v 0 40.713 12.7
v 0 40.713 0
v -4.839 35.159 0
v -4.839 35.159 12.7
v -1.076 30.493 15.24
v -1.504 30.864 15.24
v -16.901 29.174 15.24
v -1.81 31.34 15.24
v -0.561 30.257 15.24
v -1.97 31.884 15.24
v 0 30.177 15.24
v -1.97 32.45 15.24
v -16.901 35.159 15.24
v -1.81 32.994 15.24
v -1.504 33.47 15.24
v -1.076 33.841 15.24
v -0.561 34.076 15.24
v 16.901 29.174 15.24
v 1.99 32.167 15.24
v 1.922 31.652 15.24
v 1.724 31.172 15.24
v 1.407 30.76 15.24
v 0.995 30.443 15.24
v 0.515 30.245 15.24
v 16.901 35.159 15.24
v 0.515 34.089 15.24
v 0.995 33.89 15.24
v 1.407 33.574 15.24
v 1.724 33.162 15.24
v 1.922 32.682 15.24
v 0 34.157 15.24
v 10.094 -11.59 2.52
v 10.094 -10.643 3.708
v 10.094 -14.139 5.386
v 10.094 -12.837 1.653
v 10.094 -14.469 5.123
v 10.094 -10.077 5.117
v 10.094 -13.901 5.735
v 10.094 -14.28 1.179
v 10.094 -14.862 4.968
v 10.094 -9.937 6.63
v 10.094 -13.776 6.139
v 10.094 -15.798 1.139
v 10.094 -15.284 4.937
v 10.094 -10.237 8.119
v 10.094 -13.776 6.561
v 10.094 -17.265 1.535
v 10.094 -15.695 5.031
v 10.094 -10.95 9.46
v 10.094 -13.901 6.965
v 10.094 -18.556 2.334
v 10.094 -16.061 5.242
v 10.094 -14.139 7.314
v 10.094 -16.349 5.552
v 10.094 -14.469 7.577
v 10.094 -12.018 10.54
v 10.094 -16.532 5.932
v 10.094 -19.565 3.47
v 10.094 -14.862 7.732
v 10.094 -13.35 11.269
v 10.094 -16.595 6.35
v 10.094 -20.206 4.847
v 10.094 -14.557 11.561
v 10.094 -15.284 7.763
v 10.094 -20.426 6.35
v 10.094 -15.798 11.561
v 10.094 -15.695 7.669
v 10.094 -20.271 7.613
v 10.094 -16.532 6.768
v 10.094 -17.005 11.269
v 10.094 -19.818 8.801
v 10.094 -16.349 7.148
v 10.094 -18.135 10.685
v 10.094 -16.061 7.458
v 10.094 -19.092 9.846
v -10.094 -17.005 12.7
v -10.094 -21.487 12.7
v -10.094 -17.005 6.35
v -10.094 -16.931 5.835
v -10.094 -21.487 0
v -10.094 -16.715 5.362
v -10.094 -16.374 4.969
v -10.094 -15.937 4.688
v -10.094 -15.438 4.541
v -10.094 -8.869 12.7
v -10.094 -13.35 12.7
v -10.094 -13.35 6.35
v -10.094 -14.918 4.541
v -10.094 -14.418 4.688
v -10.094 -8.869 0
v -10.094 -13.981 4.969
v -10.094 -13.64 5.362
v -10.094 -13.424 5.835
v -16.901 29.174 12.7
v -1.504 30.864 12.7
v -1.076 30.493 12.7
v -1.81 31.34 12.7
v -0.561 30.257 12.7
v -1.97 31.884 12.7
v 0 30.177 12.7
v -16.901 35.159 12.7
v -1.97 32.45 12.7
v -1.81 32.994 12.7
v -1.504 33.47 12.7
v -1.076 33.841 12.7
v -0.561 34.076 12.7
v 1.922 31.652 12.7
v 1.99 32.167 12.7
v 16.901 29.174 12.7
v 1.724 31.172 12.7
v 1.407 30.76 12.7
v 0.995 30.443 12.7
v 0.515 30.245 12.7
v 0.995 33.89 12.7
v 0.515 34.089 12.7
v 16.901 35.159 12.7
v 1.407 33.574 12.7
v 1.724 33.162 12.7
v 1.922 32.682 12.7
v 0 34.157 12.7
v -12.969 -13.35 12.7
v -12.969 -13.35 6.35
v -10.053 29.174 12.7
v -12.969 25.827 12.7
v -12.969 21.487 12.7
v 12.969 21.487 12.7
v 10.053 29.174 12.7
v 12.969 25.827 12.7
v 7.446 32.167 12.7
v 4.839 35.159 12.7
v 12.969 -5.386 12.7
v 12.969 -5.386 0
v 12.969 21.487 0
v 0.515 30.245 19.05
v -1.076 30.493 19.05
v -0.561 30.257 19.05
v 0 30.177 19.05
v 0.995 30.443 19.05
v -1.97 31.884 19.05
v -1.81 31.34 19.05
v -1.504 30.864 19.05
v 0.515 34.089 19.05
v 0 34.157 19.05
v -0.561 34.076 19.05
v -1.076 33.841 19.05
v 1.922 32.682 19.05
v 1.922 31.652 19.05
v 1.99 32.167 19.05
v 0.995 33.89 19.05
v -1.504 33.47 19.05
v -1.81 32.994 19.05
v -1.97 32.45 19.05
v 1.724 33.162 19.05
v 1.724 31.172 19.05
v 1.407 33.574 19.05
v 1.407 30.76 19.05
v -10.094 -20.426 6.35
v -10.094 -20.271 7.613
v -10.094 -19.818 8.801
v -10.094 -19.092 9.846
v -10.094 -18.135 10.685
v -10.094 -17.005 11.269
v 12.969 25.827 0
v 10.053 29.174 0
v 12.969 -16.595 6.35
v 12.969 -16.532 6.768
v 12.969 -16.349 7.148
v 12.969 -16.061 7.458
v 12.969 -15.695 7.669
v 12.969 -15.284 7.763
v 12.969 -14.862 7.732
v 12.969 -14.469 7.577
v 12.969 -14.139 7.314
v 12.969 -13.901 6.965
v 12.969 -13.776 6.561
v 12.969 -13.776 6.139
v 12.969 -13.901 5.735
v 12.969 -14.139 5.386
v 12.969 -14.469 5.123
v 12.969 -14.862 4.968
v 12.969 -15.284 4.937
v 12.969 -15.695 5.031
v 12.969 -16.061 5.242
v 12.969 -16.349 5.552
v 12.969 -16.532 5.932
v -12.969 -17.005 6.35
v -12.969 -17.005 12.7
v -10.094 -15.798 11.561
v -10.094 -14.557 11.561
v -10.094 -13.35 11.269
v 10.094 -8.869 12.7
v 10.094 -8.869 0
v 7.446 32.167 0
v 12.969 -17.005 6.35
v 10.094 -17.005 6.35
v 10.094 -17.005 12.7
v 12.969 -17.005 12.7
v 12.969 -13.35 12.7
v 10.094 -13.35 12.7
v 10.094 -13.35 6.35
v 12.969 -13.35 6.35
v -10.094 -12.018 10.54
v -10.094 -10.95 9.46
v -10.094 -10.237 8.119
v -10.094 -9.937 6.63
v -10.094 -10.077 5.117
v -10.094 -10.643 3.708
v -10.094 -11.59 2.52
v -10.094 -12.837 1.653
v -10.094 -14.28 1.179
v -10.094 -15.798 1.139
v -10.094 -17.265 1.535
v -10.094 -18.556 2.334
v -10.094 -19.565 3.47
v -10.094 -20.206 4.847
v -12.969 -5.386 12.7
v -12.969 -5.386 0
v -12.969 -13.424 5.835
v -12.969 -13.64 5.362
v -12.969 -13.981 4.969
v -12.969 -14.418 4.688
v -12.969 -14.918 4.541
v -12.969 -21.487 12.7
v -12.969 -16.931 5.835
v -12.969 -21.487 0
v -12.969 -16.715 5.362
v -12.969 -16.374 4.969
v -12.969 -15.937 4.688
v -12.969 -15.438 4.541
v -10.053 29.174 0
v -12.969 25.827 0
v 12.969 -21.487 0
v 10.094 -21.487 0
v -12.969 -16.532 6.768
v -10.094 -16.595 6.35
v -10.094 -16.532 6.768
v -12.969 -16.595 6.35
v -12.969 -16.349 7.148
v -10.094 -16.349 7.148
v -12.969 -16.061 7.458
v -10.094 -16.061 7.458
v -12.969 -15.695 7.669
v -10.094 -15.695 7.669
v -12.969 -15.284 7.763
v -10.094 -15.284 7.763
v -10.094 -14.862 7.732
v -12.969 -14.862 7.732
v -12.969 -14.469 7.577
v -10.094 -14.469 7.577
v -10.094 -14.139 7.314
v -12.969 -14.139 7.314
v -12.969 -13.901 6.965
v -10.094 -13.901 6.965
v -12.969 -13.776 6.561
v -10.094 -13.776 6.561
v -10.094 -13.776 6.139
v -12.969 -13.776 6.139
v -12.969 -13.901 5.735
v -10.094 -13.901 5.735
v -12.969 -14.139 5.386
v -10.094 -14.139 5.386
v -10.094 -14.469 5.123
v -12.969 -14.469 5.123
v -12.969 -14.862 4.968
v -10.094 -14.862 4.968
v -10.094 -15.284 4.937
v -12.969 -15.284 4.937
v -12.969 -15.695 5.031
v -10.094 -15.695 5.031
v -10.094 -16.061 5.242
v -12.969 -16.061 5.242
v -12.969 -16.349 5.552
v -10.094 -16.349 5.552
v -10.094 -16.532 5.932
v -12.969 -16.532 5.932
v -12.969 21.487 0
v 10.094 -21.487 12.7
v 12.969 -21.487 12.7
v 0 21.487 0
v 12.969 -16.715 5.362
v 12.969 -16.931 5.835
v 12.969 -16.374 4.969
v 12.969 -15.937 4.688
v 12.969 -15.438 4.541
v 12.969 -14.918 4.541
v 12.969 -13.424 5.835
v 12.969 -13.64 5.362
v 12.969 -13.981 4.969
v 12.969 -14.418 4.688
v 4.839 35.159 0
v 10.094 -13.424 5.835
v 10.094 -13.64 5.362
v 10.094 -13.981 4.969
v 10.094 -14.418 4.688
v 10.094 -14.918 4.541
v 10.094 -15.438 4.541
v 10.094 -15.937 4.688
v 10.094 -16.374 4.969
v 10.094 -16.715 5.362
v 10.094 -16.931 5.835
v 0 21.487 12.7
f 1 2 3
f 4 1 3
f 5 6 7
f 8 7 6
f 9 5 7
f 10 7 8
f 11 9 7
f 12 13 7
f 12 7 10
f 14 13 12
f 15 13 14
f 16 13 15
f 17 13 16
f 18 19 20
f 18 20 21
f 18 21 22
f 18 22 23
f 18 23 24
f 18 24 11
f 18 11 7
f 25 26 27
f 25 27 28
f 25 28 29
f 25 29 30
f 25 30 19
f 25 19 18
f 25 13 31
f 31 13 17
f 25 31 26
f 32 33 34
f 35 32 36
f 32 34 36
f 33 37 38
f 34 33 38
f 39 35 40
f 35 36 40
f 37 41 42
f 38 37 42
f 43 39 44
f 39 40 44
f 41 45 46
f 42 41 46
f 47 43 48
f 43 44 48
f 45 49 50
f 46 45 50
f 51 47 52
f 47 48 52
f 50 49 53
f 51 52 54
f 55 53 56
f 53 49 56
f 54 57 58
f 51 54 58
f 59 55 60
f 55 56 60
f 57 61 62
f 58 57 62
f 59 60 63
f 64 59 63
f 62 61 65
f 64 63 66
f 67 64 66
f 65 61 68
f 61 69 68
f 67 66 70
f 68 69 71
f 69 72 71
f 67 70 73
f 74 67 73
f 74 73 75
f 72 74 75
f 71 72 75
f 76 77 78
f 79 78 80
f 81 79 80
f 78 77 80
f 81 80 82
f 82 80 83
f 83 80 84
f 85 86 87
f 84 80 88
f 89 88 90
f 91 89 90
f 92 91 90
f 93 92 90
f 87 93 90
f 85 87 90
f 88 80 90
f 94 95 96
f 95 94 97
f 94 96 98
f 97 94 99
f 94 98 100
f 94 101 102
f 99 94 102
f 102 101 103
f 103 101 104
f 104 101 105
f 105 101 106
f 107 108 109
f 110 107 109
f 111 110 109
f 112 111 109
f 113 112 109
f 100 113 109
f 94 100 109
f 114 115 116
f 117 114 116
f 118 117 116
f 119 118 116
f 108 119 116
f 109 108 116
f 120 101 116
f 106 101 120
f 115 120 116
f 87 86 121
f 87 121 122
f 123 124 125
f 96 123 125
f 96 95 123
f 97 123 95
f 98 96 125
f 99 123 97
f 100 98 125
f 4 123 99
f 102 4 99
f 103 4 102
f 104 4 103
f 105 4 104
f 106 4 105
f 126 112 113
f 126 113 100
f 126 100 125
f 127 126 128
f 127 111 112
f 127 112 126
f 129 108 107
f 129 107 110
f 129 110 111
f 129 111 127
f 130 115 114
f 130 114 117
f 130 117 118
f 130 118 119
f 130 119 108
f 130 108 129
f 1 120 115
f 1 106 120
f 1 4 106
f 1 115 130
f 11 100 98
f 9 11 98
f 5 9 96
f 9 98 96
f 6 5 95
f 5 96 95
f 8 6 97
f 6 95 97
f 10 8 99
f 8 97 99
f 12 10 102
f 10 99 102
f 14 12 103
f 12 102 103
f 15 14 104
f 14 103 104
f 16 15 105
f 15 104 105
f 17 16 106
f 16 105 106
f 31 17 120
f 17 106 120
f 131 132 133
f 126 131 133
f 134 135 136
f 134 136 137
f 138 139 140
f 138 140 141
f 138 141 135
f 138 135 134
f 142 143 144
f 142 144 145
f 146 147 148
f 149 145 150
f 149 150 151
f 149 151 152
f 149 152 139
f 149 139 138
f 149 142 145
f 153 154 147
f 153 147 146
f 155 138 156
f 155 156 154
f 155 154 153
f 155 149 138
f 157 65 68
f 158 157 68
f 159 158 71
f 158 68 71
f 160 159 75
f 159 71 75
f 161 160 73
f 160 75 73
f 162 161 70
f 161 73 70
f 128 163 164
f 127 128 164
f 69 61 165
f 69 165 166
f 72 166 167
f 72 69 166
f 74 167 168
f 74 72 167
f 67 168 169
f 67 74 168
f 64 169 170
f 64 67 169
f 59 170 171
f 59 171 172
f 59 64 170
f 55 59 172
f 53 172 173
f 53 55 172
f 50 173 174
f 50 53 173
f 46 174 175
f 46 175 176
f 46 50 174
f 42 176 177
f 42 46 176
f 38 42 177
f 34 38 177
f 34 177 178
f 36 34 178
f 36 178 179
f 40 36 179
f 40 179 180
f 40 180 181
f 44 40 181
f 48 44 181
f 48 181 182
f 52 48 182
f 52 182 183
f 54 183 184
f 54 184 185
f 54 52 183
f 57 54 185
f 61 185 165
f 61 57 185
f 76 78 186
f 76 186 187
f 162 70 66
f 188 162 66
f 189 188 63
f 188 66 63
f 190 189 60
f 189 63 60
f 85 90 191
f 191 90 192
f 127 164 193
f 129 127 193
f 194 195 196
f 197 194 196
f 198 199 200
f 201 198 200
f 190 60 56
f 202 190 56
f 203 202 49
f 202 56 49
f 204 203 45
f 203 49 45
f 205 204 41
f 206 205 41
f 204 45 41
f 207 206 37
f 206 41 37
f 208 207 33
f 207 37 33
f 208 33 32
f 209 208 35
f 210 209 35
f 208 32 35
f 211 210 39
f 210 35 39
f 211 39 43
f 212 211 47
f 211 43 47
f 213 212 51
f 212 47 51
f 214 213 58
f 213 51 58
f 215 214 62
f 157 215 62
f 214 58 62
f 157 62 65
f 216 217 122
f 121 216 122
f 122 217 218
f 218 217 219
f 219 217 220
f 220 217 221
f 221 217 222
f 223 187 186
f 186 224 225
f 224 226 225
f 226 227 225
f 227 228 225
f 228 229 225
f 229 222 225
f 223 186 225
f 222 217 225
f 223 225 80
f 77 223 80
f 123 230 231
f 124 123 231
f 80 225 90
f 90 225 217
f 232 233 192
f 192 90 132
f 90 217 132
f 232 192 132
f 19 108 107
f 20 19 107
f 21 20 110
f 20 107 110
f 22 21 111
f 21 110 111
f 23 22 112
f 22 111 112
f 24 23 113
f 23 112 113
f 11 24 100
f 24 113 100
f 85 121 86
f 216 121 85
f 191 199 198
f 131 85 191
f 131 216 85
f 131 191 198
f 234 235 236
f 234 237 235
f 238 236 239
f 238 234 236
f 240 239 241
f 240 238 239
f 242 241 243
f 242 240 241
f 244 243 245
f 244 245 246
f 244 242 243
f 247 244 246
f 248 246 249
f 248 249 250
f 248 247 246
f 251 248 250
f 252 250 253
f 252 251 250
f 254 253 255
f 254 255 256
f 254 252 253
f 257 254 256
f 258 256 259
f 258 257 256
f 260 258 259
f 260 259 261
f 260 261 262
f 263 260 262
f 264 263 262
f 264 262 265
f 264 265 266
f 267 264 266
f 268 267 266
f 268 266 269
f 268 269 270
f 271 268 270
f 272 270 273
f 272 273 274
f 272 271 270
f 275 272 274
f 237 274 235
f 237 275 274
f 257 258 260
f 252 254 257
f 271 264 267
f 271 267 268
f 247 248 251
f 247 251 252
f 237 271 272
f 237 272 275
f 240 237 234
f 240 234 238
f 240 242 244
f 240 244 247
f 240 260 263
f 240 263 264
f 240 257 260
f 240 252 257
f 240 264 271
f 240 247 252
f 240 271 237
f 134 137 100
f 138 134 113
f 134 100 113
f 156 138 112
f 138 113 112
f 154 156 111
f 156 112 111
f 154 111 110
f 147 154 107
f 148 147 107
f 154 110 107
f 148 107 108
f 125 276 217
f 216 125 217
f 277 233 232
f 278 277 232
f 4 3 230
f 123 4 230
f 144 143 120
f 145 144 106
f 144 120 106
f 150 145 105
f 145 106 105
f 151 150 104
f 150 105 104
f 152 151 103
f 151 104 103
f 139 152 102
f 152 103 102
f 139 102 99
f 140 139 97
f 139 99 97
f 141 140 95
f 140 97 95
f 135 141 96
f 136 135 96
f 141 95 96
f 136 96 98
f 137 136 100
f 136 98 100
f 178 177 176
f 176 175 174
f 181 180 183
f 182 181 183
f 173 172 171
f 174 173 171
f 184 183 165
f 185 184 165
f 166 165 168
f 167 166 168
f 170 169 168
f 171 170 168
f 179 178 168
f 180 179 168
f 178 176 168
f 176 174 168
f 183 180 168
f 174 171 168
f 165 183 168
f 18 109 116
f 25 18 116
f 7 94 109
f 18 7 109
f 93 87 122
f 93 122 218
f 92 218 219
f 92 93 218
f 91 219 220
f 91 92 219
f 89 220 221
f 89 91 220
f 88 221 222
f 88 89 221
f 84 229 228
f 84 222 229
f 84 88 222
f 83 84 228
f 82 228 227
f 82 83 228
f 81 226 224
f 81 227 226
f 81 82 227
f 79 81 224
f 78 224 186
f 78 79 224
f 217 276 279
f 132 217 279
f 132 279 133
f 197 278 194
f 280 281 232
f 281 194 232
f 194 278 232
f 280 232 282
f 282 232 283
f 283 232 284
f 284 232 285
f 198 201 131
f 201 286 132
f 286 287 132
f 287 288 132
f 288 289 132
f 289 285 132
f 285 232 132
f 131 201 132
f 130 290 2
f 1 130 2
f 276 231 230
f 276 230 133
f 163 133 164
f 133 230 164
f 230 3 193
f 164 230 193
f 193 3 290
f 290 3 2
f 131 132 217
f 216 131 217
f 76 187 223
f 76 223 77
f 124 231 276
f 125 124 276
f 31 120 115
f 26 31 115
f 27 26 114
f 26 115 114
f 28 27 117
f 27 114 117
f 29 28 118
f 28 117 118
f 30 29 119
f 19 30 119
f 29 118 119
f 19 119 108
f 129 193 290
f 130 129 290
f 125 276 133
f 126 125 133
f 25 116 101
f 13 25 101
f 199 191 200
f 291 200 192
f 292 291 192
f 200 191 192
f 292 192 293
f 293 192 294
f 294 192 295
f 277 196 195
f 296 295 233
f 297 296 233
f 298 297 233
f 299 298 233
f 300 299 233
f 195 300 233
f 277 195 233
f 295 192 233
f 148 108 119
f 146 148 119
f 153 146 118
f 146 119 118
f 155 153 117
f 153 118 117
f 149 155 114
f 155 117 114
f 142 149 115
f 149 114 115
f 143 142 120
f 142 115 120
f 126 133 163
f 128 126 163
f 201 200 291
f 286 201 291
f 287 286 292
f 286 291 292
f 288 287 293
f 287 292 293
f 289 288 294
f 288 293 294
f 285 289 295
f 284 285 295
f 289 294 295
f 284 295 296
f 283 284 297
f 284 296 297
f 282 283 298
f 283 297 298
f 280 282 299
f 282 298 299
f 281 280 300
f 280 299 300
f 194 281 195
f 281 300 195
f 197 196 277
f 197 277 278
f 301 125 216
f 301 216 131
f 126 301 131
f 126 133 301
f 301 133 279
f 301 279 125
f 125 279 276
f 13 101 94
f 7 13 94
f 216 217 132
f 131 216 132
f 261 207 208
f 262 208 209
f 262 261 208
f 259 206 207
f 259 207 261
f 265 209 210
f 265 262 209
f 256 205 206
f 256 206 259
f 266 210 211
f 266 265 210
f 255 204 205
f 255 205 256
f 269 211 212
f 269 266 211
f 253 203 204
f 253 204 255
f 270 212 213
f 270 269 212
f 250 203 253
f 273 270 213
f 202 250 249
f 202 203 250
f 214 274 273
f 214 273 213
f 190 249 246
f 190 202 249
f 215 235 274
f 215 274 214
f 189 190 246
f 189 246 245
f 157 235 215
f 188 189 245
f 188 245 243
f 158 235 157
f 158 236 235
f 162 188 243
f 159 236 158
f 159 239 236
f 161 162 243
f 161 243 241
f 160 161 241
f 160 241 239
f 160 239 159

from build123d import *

# Parameters (mm, degrees)
F0_W          = 12.9693616182
F0_H          = 21.4865580201
F0_H_2        = 5.3862379864
F1_DEPTH      = 12.7
F2_DEPTH      = 12.7
F3_DEPTH      = 12.7
F4_DEPTH      = 19.05
F5_START      = 12.7
F5_DEPTH      = 2.54
F6_R          = 1.4172462463
F7_DEPTH      = 6.8084548617
F7_DEPTH_BACK = 26.9963636453
F8_DEPTH      = 23.0633160099
F8_DEPTH_BACK = 2.8754072264
F9_DEPTH      = 20.1879087836


with BuildPart() as f1:
    # F0 (on Top) → F1 (new body)
    with BuildSketch(Plane.XY):
        Polygon((0, 0), (0, 21.4865580201), (-12.9693616182, 21.4865580201), (-12.9693616182, 0), (-12.9693616182, -5.3862379864), (0, -5.3862379864), align=None)
        with Locations((6.4846808091, 10.7432790101)):
            Rectangle(F0_W, F0_H)
        with Locations((6.4846808091, -2.6931189932)):
            Rectangle(F0_W, F0_H_2)
    extrude(amount=F1_DEPTH)


with BuildPart() as f2:
    # F0 (on Top) → F2 (new body, through all)
    with BuildSketch(Plane.XY):
        Polygon((0, -8.8687147945), (0, -5.3862379864), (-12.9693616182, -5.3862379864), (-12.9693616182, -21.4865580201), (-10.0939543918, -21.4865580201), (-10.0939543918, -8.8687147945), align=None)
        Polygon((12.9693616182, -5.3862379864), (0, -5.3862379864), (0, -8.8687147945), (10.0939543918, -8.8687147945), (10.0939543918, -21.4865580201), (12.9693616182, -21.4865580201), align=None)
    extrude(amount=F2_DEPTH)

    # F6 (on face) → F7 (cut, two sides)
    with BuildSketch(Plane(origin=(10.0939543918, 0, 0), x_dir=(0, -1, 0), z_dir=(-1, 0, 0))) as f7_sk:
        with BuildLine():
            ThreePointArc((13.3500925612, 6.35), (15.1776364073, 4.5224561539), (17.0051802535, 6.35))
            ThreePointArc((17.0051802535, 6.35), (15.1776364073, 8.1775438461), (13.3500925612, 6.35))
        make_face()
        with Locations((15.1776364073, 6.35)):
            Circle(F6_R, mode=Mode.SUBTRACT)
        with Locations((15.1776364073, 6.35)):
            Circle(F6_R)
        with BuildLine():
            ThreePointArc((13.3500925612, 6.35), (15.1776364073, 8.1775438461), (17.0051802535, 6.35))
            Line((17.0051802535, 6.35), (17.0051802535, 11.2694925814))
            ThreePointArc((17.0051802535, 11.2694925814), (15.1776364073, 11.5979828284), (13.3500925612, 11.2694925814))
            Line((13.3500925612, 11.2694925814), (13.3500925612, 6.35))
        make_face()
        with BuildLine():
            ThreePointArc((13.3500925612, 11.2694925814), (15.1776364073, 11.5979828284), (17.0051802535, 11.2694925814))
            Line((17.0051802535, 11.2694925814), (17.0051802535, 12.7))
            Line((17.0051802535, 12.7), (13.3500925612, 12.7))
            Line((13.3500925612, 12.7), (13.3500925612, 11.2694925814))
        make_face()
    extrude(amount=-F7_DEPTH, mode=Mode.SUBTRACT)
    extrude(f7_sk.sketch, amount=F7_DEPTH_BACK, mode=Mode.SUBTRACT)


with BuildPart() as f3:
    # F0 (on Top) → F3 (new body, through all)
    with BuildSketch(Plane.XY):
        Polygon((-12.9693616182, 21.4865580201), (0, 21.4865580201), (0, 29.1743092239), (-10.0531563319, 29.1743092239), (-12.9693616182, 25.8271116763), align=None)
        Polygon((0, 29.1743092239), (0, 21.4865580201), (12.9693616182, 21.4865580201), (12.9693616182, 25.8271116763), (10.0531563319, 29.1743092239), align=None)
        with BuildLine():
            Line((0, 30.1767262363), (0, 29.1743092239))
            Line((0, 29.1743092239), (10.0531563319, 29.1743092239))
            Line((10.0531563319, 29.1743092239), (7.4459156487, 32.1668796241))
            Line((7.4459156487, 32.1668796241), (1.9901533878, 32.1668796241))
            ThreePointArc((1.9901533878, 32.1668796241), (1.4072509561, 30.759628668), (0, 30.1767262363))
        make_face()
        with BuildLine():
            Line((0, 35.1594500244), (0, 34.1570330119))
            ThreePointArc((0, 34.1570330119), (1.4072509561, 33.5741305802), (1.9901533878, 32.1668796241))
            Line((1.9901533878, 32.1668796241), (7.4459156487, 32.1668796241))
            Line((7.4459156487, 32.1668796241), (4.8386749655, 35.1594500244))
            Line((4.8386749655, 35.1594500244), (0, 35.1594500244))
        make_face()
        Polygon((0, 40.7132431865), (0, 35.1594500244), (4.8386749655, 35.1594500244), align=None)
        with BuildLine():
            Line((-10.0531563319, 29.1743092239), (0, 29.1743092239))
            Line((0, 29.1743092239), (0, 30.1767262363))
            ThreePointArc((0, 30.1767262363), (-1.9901533878, 32.1668796241), (0, 34.1570330119))
            Line((0, 34.1570330119), (0, 35.1594500244))
            Line((0, 35.1594500244), (-4.8386749655, 35.1594500244))
            Line((-4.8386749655, 35.1594500244), (-10.0531563319, 29.1743092239))
        make_face()
        Polygon((0, 40.7132431865), (-4.8386749655, 35.1594500244), (0, 35.1594500244), align=None)
        with BuildLine():
            Line((0, 32.1668796241), (0, 30.1767262363))
            ThreePointArc((0, 30.1767262363), (1.4072509561, 30.759628668), (1.9901533878, 32.1668796241))
            Line((1.9901533878, 32.1668796241), (0, 32.1668796241))
        make_face()
        with BuildLine():
            ThreePointArc((0, 34.1570330119), (-1.9901533878, 32.1668796241), (0, 30.1767262363))
            Line((0, 30.1767262363), (0, 32.1668796241))
            Line((0, 32.1668796241), (0, 34.1570330119))
        make_face()
        with BuildLine():
            Line((0, 34.1570330119), (0, 32.1668796241))
            Line((0, 32.1668796241), (1.9901533878, 32.1668796241))
            ThreePointArc((1.9901533878, 32.1668796241), (1.4072509561, 33.5741305802), (0, 34.1570330119))
        make_face()
    extrude(amount=F3_DEPTH)

    # F0 (on Top) → F4 (join)
    with BuildSketch(Plane.XY):
        with BuildLine():
            Line((0, 32.1668796241), (0, 30.1767262363))
            ThreePointArc((0, 30.1767262363), (1.4072509561, 30.759628668), (1.9901533878, 32.1668796241))
            Line((1.9901533878, 32.1668796241), (0, 32.1668796241))
        make_face()
        with BuildLine():
            Line((0, 34.1570330119), (0, 32.1668796241))
            Line((0, 32.1668796241), (1.9901533878, 32.1668796241))
            ThreePointArc((1.9901533878, 32.1668796241), (1.4072509561, 33.5741305802), (0, 34.1570330119))
        make_face()
        with BuildLine():
            ThreePointArc((0, 34.1570330119), (-1.9901533878, 32.1668796241), (0, 30.1767262363))
            Line((0, 30.1767262363), (0, 32.1668796241))
            Line((0, 32.1668796241), (0, 34.1570330119))
        make_face()
    extrude(amount=F4_DEPTH)


with BuildPart() as f5:
    # F0 (on Top) → F5 (new body)
    with BuildSketch(Plane.XY.offset(F5_START)):
        Polygon((7.4459156487, 32.1668796241), (10.0531563319, 29.1743092239), (16.9014092535, 29.1743092239), (16.9014092535, 32.1668796241), align=None)
        with BuildLine():
            Line((0, 30.1767262363), (0, 29.1743092239))
            Line((0, 29.1743092239), (10.0531563319, 29.1743092239))
            Line((10.0531563319, 29.1743092239), (7.4459156487, 32.1668796241))
            Line((7.4459156487, 32.1668796241), (1.9901533878, 32.1668796241))
            ThreePointArc((1.9901533878, 32.1668796241), (1.4072509561, 30.759628668), (0, 30.1767262363))
        make_face()
        Polygon((4.8386749655, 35.1594500244), (7.4459156487, 32.1668796241), (16.9014092535, 32.1668796241), (16.9014092535, 35.1594500244), align=None)
        with BuildLine():
            Line((0, 35.1594500244), (0, 34.1570330119))
            ThreePointArc((0, 34.1570330119), (1.4072509561, 33.5741305802), (1.9901533878, 32.1668796241))
            Line((1.9901533878, 32.1668796241), (7.4459156487, 32.1668796241))
            Line((7.4459156487, 32.1668796241), (4.8386749655, 35.1594500244))
            Line((4.8386749655, 35.1594500244), (0, 35.1594500244))
        make_face()
        with BuildLine():
            Line((-10.0531563319, 29.1743092239), (0, 29.1743092239))
            Line((0, 29.1743092239), (0, 30.1767262363))
            ThreePointArc((0, 30.1767262363), (-1.9901533878, 32.1668796241), (0, 34.1570330119))
            Line((0, 34.1570330119), (0, 35.1594500244))
            Line((0, 35.1594500244), (-4.8386749655, 35.1594500244))
            Line((-4.8386749655, 35.1594500244), (-10.0531563319, 29.1743092239))
        make_face()
        Polygon((-16.9014092535, 29.1743092239), (-10.0531563319, 29.1743092239), (-4.8386749655, 35.1594500244), (-16.9014092535, 35.1594500244), (-16.9014092535, 32.1668796241), align=None)
    extrude(amount=F5_DEPTH)


with BuildPart() as f8:
    # F6 (on face) → F8 (new body, two sides)
    with BuildSketch(Plane(origin=(10.0939543918, 0, 0), x_dir=(0, -1, 0), z_dir=(-1, 0, 0))) as f8_sk:
        with Locations((15.1776364073, 6.35)):
            Circle(F6_R)
    extrude(amount=F8_DEPTH)
    extrude(f8_sk.sketch, amount=-F8_DEPTH_BACK)

    # F6 (on face) → F9 (join, through all)
    with BuildSketch(Plane(origin=(10.0939543918, 0, 0), x_dir=(0, -1, 0), z_dir=(-1, 0, 0))):
        with BuildLine():
            ThreePointArc((13.3500925612, 6.35), (15.1776364073, 4.5224561539), (17.0051802535, 6.35))
            ThreePointArc((17.0051802535, 6.35), (15.1776364073, 8.1775438461), (13.3500925612, 6.35))
        make_face()
        with Locations((15.1776364073, 6.35)):
            Circle(F6_R, mode=Mode.SUBTRACT)
        with BuildLine():
            ThreePointArc((13.3500925612, 6.35), (15.1776364073, 8.1775438461), (17.0051802535, 6.35))
            Line((17.0051802535, 6.35), (17.0051802535, 11.2694925814))
            ThreePointArc((17.0051802535, 11.2694925814), (15.1776364073, 11.5979828284), (13.3500925612, 11.2694925814))
            Line((13.3500925612, 11.2694925814), (13.3500925612, 6.35))
        make_face()
        with BuildLine():
            Line((17.0051802535, 11.2694925814), (17.0051802535, 6.35))
            ThreePointArc((17.0051802535, 6.35), (15.1776364073, 4.5224561539), (13.3500925612, 6.35))
            Line((13.3500925612, 6.35), (13.3500925612, 11.2694925814))
            ThreePointArc((13.3500925612, 11.2694925814), (12.181772171, 2.0411577837), (20.4256192358, 6.35))
            ThreePointArc((20.4256192358, 6.35), (19.4864786236, 9.3458642363), (17.0051802535, 11.2694925814))
        make_face()
    extrude(amount=F9_DEPTH)


solid = Compound([f1.part, f2.part, f3.part, f5.part, f8.part])
